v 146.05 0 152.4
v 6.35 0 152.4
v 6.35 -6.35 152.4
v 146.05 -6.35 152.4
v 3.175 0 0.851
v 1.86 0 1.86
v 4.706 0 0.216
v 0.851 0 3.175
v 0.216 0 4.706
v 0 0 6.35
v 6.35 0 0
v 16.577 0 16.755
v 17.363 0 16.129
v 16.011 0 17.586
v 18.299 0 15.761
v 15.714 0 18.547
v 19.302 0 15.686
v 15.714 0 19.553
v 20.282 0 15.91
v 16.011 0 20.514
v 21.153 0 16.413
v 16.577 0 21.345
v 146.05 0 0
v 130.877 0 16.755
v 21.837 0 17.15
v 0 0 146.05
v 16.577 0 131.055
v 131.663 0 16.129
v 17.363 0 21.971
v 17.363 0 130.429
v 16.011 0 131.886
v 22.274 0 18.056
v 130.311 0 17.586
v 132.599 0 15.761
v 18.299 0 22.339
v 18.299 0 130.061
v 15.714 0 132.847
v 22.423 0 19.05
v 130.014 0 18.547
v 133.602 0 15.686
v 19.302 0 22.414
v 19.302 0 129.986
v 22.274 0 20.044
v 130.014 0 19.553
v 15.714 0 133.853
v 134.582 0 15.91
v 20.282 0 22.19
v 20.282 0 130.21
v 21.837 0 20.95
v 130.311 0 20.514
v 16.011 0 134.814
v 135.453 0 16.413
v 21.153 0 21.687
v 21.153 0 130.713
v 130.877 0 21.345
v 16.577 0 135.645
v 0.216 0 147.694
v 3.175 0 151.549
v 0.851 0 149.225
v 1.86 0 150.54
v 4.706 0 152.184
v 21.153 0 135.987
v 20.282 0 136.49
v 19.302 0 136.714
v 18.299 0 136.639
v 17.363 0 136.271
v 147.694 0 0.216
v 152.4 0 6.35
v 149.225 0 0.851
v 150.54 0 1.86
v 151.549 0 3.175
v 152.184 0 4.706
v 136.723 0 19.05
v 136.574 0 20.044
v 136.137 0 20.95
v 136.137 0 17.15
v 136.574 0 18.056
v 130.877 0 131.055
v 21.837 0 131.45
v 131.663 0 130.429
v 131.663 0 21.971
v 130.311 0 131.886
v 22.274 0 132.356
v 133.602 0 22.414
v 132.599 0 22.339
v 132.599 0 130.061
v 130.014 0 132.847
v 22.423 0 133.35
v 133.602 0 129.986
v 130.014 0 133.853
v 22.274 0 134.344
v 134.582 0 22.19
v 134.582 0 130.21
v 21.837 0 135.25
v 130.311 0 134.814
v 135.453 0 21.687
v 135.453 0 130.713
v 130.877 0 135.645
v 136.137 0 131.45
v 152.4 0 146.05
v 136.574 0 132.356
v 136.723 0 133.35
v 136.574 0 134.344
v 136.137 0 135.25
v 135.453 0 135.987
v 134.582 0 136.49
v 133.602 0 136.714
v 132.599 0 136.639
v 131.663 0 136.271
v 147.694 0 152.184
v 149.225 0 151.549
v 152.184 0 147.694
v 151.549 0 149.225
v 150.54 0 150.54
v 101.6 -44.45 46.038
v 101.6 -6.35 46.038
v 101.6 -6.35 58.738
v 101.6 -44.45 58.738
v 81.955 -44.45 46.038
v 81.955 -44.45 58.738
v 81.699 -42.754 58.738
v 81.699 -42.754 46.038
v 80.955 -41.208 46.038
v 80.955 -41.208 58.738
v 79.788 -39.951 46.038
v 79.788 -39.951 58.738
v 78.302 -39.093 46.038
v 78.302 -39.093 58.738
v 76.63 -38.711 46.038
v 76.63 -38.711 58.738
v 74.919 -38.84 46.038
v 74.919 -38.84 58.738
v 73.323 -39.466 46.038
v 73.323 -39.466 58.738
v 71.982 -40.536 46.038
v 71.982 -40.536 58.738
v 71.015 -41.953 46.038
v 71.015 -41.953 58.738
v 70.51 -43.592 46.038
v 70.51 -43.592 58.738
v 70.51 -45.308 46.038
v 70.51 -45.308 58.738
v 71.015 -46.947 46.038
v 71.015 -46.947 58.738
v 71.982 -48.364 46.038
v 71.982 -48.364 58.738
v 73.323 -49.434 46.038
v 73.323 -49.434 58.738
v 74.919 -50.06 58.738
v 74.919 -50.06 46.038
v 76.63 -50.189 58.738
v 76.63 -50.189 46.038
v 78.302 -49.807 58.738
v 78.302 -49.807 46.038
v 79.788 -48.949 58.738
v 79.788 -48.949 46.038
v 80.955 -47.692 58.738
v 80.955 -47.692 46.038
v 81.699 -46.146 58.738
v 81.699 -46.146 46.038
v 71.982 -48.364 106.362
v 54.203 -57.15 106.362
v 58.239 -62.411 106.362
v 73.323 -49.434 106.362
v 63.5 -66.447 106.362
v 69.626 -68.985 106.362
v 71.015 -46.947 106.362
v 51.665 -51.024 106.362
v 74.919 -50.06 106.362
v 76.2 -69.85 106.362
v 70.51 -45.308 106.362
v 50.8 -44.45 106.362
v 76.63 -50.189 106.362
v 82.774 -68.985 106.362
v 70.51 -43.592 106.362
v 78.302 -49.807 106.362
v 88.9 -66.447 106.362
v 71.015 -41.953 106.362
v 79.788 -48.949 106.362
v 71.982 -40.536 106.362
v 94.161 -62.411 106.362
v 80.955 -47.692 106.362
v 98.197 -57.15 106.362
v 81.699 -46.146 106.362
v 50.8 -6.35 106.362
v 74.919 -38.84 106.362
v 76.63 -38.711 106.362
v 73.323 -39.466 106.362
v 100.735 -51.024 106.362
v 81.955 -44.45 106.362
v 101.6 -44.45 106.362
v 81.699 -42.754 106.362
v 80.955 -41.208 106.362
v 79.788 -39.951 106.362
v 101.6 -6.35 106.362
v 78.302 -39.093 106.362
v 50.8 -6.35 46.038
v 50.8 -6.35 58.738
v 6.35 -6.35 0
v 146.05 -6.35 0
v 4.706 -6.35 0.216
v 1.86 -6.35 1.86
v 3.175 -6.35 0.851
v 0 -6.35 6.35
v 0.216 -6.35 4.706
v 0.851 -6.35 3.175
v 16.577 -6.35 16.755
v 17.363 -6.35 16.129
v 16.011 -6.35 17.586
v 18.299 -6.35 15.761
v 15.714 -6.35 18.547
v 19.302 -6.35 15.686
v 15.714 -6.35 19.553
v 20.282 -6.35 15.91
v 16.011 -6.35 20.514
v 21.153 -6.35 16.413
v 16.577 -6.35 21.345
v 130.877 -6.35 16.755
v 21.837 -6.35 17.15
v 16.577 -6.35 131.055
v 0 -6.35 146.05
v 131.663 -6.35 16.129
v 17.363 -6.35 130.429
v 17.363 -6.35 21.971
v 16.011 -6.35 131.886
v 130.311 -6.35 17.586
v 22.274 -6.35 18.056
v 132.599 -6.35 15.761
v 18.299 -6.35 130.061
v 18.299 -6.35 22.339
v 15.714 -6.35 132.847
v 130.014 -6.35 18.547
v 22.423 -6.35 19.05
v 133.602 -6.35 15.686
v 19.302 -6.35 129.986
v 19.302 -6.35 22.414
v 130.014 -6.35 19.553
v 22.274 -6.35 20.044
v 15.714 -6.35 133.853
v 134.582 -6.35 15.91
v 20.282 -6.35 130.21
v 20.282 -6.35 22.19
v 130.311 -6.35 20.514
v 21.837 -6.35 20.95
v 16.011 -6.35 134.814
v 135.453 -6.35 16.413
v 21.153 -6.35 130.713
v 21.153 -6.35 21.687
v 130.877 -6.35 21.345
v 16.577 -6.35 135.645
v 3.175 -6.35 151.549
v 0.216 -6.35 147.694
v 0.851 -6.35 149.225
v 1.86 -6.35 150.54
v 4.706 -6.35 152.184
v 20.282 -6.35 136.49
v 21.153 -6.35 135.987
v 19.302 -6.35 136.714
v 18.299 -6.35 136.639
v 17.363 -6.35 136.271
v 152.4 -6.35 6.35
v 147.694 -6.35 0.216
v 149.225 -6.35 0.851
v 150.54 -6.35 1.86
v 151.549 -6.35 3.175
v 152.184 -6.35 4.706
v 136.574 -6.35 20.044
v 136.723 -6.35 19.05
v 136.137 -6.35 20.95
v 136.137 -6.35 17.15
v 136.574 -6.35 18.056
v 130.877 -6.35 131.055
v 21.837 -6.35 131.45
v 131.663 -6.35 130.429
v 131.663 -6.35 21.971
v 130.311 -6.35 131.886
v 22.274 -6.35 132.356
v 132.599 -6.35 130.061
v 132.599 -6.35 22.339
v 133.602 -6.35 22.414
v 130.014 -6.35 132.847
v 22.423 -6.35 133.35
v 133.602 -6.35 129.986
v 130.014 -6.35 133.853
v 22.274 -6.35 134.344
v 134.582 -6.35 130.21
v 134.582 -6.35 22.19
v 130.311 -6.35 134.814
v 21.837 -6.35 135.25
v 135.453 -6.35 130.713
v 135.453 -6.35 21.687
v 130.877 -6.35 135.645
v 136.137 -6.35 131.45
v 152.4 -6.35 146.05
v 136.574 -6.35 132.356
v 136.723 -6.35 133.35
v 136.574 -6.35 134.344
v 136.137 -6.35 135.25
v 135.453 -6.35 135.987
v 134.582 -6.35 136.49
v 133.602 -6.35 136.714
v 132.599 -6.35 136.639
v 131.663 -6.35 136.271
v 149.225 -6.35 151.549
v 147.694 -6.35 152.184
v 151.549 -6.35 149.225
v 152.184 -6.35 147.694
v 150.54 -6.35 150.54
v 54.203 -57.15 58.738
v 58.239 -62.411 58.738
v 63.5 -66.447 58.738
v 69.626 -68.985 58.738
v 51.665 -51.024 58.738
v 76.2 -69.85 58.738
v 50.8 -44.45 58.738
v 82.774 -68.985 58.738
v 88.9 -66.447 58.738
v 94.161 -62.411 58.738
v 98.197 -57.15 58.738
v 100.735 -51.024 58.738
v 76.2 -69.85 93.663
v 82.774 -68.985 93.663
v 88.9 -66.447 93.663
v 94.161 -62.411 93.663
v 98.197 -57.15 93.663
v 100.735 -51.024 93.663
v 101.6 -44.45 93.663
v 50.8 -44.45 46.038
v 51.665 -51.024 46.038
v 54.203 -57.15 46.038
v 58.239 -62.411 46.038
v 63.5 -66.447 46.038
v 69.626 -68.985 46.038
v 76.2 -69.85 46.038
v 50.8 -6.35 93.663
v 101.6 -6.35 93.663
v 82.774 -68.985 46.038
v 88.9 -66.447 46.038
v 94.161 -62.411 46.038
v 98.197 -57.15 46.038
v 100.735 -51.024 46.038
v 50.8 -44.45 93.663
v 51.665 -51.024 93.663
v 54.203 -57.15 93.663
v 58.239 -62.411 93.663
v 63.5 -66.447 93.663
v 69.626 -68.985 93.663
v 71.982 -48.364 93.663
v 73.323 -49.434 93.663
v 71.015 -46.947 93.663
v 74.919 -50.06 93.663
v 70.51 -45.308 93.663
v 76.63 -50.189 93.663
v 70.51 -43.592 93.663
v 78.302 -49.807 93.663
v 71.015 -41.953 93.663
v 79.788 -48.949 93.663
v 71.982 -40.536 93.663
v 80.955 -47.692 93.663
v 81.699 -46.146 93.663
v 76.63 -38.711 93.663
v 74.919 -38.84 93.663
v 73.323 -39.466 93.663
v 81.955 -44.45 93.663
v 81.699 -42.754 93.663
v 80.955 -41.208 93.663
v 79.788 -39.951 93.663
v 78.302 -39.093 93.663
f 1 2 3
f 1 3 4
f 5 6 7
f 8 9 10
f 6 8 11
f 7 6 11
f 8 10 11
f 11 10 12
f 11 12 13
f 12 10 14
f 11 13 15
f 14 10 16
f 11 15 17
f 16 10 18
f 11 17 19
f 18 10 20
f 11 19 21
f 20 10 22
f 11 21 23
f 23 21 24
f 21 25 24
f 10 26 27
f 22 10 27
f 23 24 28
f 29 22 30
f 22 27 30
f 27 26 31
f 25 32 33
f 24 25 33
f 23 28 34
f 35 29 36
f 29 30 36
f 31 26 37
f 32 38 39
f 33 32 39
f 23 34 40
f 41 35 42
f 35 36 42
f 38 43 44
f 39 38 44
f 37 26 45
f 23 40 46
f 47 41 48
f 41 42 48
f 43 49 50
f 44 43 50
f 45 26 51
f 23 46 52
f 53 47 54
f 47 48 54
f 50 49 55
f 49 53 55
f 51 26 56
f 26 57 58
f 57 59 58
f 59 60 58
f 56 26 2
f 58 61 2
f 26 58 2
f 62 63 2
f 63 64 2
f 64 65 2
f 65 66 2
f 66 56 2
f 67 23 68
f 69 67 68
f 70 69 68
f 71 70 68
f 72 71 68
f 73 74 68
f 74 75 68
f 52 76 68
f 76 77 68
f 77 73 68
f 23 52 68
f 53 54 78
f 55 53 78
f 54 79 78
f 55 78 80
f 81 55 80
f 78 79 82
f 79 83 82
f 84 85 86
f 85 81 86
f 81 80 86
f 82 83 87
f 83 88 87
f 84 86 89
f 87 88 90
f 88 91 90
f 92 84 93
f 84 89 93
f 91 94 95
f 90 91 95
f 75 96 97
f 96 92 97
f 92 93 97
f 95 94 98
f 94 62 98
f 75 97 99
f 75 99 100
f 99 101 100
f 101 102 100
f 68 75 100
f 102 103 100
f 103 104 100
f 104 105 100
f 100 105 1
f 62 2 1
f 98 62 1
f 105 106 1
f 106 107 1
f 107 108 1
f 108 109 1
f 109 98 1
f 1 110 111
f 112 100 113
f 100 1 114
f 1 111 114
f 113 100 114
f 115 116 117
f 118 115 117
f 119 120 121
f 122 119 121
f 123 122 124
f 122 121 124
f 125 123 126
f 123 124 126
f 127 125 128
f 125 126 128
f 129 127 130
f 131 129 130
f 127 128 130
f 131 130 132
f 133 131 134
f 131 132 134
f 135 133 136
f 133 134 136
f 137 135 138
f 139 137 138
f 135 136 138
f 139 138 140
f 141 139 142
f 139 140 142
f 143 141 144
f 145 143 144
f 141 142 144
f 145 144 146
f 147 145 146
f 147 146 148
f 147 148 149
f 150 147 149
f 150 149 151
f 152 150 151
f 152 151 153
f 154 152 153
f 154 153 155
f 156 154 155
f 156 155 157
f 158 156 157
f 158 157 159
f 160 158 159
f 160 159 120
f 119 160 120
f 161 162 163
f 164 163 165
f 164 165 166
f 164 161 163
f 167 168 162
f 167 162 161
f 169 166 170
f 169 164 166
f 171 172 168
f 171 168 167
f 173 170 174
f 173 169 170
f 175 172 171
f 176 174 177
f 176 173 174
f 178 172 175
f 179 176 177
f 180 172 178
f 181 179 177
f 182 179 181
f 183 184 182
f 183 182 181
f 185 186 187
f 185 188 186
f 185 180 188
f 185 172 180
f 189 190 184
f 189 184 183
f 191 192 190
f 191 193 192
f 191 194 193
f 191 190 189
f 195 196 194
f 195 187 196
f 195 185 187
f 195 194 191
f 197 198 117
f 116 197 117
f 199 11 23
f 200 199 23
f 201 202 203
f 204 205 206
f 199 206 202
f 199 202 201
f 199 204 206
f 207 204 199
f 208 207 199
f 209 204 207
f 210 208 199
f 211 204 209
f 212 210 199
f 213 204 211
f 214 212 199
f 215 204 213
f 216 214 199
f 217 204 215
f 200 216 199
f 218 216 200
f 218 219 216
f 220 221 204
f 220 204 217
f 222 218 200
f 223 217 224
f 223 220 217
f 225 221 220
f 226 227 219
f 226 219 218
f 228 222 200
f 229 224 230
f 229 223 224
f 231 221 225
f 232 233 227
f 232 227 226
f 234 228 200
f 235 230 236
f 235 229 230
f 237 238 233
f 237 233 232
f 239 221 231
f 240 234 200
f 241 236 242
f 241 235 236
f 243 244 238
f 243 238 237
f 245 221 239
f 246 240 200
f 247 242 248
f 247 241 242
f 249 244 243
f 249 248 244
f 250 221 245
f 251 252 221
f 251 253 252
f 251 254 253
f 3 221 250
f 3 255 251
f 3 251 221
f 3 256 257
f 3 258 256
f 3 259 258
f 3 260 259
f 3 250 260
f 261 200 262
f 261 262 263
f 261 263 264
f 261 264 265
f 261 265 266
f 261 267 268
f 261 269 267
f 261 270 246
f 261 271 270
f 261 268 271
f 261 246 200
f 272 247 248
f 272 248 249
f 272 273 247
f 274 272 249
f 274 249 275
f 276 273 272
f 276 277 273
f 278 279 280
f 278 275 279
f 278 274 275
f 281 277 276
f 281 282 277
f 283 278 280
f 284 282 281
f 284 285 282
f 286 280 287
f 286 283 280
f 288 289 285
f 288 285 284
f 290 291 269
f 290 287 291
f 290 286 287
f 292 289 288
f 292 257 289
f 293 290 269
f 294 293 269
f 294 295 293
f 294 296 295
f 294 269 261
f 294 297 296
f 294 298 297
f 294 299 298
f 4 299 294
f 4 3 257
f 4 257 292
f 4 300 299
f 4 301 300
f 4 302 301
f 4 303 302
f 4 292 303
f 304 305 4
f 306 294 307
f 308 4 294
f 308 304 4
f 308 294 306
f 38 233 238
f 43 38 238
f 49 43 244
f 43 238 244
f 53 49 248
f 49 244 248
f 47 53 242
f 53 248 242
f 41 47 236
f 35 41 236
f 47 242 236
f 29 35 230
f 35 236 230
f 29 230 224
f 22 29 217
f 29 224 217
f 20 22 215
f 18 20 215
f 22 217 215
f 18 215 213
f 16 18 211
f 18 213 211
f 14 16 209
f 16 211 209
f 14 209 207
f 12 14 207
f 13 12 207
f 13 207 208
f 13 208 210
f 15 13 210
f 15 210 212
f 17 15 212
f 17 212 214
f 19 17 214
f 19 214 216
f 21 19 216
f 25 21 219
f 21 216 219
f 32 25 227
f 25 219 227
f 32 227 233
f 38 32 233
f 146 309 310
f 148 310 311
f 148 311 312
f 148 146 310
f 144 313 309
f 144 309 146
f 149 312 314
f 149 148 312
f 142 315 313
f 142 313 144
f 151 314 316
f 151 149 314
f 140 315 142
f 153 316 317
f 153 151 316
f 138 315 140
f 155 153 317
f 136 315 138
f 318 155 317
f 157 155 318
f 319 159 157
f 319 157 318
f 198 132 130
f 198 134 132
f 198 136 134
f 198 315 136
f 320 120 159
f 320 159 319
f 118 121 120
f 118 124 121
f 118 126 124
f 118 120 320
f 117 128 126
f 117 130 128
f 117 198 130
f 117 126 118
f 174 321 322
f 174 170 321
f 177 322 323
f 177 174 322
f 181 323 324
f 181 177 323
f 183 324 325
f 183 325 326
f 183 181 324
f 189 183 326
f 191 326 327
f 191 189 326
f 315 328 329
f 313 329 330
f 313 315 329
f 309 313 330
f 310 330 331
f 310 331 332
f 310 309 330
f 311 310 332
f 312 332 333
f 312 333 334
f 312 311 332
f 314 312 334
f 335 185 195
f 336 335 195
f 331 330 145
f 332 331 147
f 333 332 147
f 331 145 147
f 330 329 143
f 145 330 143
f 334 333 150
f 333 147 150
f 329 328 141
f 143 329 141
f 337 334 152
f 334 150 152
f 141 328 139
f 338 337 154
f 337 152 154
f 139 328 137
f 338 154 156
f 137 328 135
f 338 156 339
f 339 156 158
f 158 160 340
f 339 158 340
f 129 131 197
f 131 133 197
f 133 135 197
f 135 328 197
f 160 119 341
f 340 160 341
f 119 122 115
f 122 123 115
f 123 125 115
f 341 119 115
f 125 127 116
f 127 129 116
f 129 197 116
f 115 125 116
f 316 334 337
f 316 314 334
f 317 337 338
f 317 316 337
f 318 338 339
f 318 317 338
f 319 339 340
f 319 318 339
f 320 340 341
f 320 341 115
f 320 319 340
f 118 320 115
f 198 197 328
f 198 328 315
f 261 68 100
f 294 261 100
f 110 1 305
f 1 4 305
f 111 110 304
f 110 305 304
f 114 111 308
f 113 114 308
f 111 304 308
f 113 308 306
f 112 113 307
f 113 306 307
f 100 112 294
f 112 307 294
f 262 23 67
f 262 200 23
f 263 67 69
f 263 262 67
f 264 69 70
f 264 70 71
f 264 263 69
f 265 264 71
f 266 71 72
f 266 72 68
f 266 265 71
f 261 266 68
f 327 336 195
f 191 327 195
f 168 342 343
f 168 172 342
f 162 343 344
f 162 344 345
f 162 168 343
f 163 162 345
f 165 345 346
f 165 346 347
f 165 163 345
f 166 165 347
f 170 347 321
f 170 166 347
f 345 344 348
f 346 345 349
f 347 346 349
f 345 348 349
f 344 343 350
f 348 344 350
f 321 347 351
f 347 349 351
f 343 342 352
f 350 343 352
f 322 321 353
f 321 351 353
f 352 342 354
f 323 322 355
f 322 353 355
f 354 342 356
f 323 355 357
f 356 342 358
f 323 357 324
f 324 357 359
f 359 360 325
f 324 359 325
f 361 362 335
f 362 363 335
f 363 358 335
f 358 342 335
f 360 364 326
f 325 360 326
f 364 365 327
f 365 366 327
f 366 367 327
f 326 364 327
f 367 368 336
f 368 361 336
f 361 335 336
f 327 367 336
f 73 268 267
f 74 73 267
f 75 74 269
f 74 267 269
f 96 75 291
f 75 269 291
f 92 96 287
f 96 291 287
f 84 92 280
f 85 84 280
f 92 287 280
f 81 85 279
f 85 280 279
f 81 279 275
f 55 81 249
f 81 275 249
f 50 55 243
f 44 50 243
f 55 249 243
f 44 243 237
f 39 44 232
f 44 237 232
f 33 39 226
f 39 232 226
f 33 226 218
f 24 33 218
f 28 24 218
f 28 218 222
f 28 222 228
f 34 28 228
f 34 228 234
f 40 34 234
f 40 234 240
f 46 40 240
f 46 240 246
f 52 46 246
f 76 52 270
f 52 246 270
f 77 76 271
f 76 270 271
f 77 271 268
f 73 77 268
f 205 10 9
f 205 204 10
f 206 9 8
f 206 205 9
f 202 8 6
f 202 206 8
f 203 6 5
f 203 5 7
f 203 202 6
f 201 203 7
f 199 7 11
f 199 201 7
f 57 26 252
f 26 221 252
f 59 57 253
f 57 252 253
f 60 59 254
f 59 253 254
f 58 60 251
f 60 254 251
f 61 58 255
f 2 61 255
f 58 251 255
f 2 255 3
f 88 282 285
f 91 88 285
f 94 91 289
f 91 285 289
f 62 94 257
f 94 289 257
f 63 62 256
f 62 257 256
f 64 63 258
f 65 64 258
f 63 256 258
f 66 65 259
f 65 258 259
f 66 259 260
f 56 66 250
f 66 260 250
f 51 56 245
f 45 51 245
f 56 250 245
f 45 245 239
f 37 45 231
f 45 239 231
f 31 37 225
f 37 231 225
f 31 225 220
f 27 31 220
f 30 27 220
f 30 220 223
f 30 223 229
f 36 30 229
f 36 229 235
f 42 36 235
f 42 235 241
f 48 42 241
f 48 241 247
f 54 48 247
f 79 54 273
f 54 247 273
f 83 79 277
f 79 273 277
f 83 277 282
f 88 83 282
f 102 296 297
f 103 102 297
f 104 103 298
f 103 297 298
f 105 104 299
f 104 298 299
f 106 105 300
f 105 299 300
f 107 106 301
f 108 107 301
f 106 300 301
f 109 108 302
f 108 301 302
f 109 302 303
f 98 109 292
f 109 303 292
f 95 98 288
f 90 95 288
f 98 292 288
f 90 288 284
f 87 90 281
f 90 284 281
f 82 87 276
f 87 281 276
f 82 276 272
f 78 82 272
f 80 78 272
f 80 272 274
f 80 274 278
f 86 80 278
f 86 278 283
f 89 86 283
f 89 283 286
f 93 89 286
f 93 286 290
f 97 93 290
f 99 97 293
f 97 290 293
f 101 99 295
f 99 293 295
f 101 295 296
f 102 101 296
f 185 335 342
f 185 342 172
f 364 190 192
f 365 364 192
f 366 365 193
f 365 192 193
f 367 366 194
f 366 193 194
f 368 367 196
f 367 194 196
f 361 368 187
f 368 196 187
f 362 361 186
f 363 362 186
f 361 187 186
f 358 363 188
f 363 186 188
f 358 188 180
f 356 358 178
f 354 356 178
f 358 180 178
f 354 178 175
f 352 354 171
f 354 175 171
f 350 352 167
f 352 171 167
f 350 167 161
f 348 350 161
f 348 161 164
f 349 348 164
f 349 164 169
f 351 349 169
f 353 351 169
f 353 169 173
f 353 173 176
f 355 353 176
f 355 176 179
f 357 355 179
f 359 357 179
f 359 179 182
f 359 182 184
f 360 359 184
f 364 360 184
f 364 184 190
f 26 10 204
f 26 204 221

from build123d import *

# Parameters (mm, degrees)
F0_W     = 152.4
F0_H     = 152.4
F1_DEPTH = 6.35
F2_W     = 50.8
F2_H     = 12.7
F3_DEPTH = 63.5
F4_R     = 5.7546875
F5_DEPTH = 76.2
F6_R     = 3.3734375
F7_DEPTH = 6.35
F8_R     = 25.39999
F8_2_R   = 25.39999
F9_R     = 6.35


# Not quite as in the source:
# - a fillet or chamfer is up to 0.001 mm smaller than in the source, because OpenCascade refuses the exact size


with BuildPart() as f1:
    # F0 (on Front) → F1 (new body)
    with BuildSketch(Plane.XZ):
        with Locations((76.2, 76.2)):
            Rectangle(F0_W, F0_H)
    extrude(amount=F1_DEPTH)

    # F6 (on face) → F7 (cut)
    with BuildSketch(Plane.XZ.offset(6.35)):
        with Locations((19.05, 133.35)):
            Circle(F6_R)
        with Locations((133.35, 133.35)):
            Circle(F6_R)
        with Locations((19.05, 19.05)):
            Circle(F6_R)
        with Locations((133.35, 19.05)):
            Circle(F6_R)
    extrude(amount=-F7_DEPTH, mode=Mode.SUBTRACT)

    # F9
    f9_edges = [f1.edges().sort_by_distance(p)[0] for p in [
        (0, -3.175, 152.4),
        (152.4, -3.175, 152.4),
        (0, -3.175, 0),
        (152.4, -3.175, 0),
    ]]
    fillet(f9_edges, radius=F9_R)


with BuildPart() as f3:
    # F2 (on face) → F3 (new body)
    with BuildSketch(Plane.XZ.offset(6.35)):
        with Locations((76.2, 100.0125)):
            Rectangle(F2_W, F2_H)
    extrude(amount=F3_DEPTH)


with BuildPart() as f3b:
    # F2 (on face) → F3, piece 2 (new body)
    with BuildSketch(Plane.XZ.offset(6.35)):
        with Locations((76.2, 52.3875)):
            Rectangle(F2_W, F2_H)
    extrude(amount=F3_DEPTH)


with BuildPart() as f5_tool:
    # F4 (on face) → F5 (new body)
    with BuildSketch(Plane.XY.offset(106.3625)):
        with Locations((76.2, -44.45)):
            Circle(F4_R)
    extrude(amount=-F5_DEPTH)


with BuildPart() as f3_1:
    add(f3.part)

    # F5: cut by f5_tool
    add(f5_tool.part, mode=Mode.SUBTRACT)

    # F8 (radius 25.4 in the source; OpenCascade refuses exactly that, so slightly less here)
    f8_edges = [f3_1.edges().sort_by_distance(p)[0] for p in [
        (50.8, -69.85, 100.0125),
        (101.6, -69.85, 100.0125),
    ]]
    fillet(f8_edges, radius=F8_R)


with BuildPart() as f3b_1:
    add(f3b.part)

    # F5: cut by f5_tool
    add(f5_tool.part, mode=Mode.SUBTRACT)

    # F8#2 (radius 25.4 in the source; OpenCascade refuses exactly that, so slightly less here)
    f8_2_edges = [f3b_1.edges().sort_by_distance(p)[0] for p in [
        (50.8, -69.85, 52.3875),
        (101.6, -69.85, 52.3875),
    ]]
    fillet(f8_2_edges, radius=F8_2_R)


solid = Compound([f1.part, f3_1.part, f3b_1.part])
